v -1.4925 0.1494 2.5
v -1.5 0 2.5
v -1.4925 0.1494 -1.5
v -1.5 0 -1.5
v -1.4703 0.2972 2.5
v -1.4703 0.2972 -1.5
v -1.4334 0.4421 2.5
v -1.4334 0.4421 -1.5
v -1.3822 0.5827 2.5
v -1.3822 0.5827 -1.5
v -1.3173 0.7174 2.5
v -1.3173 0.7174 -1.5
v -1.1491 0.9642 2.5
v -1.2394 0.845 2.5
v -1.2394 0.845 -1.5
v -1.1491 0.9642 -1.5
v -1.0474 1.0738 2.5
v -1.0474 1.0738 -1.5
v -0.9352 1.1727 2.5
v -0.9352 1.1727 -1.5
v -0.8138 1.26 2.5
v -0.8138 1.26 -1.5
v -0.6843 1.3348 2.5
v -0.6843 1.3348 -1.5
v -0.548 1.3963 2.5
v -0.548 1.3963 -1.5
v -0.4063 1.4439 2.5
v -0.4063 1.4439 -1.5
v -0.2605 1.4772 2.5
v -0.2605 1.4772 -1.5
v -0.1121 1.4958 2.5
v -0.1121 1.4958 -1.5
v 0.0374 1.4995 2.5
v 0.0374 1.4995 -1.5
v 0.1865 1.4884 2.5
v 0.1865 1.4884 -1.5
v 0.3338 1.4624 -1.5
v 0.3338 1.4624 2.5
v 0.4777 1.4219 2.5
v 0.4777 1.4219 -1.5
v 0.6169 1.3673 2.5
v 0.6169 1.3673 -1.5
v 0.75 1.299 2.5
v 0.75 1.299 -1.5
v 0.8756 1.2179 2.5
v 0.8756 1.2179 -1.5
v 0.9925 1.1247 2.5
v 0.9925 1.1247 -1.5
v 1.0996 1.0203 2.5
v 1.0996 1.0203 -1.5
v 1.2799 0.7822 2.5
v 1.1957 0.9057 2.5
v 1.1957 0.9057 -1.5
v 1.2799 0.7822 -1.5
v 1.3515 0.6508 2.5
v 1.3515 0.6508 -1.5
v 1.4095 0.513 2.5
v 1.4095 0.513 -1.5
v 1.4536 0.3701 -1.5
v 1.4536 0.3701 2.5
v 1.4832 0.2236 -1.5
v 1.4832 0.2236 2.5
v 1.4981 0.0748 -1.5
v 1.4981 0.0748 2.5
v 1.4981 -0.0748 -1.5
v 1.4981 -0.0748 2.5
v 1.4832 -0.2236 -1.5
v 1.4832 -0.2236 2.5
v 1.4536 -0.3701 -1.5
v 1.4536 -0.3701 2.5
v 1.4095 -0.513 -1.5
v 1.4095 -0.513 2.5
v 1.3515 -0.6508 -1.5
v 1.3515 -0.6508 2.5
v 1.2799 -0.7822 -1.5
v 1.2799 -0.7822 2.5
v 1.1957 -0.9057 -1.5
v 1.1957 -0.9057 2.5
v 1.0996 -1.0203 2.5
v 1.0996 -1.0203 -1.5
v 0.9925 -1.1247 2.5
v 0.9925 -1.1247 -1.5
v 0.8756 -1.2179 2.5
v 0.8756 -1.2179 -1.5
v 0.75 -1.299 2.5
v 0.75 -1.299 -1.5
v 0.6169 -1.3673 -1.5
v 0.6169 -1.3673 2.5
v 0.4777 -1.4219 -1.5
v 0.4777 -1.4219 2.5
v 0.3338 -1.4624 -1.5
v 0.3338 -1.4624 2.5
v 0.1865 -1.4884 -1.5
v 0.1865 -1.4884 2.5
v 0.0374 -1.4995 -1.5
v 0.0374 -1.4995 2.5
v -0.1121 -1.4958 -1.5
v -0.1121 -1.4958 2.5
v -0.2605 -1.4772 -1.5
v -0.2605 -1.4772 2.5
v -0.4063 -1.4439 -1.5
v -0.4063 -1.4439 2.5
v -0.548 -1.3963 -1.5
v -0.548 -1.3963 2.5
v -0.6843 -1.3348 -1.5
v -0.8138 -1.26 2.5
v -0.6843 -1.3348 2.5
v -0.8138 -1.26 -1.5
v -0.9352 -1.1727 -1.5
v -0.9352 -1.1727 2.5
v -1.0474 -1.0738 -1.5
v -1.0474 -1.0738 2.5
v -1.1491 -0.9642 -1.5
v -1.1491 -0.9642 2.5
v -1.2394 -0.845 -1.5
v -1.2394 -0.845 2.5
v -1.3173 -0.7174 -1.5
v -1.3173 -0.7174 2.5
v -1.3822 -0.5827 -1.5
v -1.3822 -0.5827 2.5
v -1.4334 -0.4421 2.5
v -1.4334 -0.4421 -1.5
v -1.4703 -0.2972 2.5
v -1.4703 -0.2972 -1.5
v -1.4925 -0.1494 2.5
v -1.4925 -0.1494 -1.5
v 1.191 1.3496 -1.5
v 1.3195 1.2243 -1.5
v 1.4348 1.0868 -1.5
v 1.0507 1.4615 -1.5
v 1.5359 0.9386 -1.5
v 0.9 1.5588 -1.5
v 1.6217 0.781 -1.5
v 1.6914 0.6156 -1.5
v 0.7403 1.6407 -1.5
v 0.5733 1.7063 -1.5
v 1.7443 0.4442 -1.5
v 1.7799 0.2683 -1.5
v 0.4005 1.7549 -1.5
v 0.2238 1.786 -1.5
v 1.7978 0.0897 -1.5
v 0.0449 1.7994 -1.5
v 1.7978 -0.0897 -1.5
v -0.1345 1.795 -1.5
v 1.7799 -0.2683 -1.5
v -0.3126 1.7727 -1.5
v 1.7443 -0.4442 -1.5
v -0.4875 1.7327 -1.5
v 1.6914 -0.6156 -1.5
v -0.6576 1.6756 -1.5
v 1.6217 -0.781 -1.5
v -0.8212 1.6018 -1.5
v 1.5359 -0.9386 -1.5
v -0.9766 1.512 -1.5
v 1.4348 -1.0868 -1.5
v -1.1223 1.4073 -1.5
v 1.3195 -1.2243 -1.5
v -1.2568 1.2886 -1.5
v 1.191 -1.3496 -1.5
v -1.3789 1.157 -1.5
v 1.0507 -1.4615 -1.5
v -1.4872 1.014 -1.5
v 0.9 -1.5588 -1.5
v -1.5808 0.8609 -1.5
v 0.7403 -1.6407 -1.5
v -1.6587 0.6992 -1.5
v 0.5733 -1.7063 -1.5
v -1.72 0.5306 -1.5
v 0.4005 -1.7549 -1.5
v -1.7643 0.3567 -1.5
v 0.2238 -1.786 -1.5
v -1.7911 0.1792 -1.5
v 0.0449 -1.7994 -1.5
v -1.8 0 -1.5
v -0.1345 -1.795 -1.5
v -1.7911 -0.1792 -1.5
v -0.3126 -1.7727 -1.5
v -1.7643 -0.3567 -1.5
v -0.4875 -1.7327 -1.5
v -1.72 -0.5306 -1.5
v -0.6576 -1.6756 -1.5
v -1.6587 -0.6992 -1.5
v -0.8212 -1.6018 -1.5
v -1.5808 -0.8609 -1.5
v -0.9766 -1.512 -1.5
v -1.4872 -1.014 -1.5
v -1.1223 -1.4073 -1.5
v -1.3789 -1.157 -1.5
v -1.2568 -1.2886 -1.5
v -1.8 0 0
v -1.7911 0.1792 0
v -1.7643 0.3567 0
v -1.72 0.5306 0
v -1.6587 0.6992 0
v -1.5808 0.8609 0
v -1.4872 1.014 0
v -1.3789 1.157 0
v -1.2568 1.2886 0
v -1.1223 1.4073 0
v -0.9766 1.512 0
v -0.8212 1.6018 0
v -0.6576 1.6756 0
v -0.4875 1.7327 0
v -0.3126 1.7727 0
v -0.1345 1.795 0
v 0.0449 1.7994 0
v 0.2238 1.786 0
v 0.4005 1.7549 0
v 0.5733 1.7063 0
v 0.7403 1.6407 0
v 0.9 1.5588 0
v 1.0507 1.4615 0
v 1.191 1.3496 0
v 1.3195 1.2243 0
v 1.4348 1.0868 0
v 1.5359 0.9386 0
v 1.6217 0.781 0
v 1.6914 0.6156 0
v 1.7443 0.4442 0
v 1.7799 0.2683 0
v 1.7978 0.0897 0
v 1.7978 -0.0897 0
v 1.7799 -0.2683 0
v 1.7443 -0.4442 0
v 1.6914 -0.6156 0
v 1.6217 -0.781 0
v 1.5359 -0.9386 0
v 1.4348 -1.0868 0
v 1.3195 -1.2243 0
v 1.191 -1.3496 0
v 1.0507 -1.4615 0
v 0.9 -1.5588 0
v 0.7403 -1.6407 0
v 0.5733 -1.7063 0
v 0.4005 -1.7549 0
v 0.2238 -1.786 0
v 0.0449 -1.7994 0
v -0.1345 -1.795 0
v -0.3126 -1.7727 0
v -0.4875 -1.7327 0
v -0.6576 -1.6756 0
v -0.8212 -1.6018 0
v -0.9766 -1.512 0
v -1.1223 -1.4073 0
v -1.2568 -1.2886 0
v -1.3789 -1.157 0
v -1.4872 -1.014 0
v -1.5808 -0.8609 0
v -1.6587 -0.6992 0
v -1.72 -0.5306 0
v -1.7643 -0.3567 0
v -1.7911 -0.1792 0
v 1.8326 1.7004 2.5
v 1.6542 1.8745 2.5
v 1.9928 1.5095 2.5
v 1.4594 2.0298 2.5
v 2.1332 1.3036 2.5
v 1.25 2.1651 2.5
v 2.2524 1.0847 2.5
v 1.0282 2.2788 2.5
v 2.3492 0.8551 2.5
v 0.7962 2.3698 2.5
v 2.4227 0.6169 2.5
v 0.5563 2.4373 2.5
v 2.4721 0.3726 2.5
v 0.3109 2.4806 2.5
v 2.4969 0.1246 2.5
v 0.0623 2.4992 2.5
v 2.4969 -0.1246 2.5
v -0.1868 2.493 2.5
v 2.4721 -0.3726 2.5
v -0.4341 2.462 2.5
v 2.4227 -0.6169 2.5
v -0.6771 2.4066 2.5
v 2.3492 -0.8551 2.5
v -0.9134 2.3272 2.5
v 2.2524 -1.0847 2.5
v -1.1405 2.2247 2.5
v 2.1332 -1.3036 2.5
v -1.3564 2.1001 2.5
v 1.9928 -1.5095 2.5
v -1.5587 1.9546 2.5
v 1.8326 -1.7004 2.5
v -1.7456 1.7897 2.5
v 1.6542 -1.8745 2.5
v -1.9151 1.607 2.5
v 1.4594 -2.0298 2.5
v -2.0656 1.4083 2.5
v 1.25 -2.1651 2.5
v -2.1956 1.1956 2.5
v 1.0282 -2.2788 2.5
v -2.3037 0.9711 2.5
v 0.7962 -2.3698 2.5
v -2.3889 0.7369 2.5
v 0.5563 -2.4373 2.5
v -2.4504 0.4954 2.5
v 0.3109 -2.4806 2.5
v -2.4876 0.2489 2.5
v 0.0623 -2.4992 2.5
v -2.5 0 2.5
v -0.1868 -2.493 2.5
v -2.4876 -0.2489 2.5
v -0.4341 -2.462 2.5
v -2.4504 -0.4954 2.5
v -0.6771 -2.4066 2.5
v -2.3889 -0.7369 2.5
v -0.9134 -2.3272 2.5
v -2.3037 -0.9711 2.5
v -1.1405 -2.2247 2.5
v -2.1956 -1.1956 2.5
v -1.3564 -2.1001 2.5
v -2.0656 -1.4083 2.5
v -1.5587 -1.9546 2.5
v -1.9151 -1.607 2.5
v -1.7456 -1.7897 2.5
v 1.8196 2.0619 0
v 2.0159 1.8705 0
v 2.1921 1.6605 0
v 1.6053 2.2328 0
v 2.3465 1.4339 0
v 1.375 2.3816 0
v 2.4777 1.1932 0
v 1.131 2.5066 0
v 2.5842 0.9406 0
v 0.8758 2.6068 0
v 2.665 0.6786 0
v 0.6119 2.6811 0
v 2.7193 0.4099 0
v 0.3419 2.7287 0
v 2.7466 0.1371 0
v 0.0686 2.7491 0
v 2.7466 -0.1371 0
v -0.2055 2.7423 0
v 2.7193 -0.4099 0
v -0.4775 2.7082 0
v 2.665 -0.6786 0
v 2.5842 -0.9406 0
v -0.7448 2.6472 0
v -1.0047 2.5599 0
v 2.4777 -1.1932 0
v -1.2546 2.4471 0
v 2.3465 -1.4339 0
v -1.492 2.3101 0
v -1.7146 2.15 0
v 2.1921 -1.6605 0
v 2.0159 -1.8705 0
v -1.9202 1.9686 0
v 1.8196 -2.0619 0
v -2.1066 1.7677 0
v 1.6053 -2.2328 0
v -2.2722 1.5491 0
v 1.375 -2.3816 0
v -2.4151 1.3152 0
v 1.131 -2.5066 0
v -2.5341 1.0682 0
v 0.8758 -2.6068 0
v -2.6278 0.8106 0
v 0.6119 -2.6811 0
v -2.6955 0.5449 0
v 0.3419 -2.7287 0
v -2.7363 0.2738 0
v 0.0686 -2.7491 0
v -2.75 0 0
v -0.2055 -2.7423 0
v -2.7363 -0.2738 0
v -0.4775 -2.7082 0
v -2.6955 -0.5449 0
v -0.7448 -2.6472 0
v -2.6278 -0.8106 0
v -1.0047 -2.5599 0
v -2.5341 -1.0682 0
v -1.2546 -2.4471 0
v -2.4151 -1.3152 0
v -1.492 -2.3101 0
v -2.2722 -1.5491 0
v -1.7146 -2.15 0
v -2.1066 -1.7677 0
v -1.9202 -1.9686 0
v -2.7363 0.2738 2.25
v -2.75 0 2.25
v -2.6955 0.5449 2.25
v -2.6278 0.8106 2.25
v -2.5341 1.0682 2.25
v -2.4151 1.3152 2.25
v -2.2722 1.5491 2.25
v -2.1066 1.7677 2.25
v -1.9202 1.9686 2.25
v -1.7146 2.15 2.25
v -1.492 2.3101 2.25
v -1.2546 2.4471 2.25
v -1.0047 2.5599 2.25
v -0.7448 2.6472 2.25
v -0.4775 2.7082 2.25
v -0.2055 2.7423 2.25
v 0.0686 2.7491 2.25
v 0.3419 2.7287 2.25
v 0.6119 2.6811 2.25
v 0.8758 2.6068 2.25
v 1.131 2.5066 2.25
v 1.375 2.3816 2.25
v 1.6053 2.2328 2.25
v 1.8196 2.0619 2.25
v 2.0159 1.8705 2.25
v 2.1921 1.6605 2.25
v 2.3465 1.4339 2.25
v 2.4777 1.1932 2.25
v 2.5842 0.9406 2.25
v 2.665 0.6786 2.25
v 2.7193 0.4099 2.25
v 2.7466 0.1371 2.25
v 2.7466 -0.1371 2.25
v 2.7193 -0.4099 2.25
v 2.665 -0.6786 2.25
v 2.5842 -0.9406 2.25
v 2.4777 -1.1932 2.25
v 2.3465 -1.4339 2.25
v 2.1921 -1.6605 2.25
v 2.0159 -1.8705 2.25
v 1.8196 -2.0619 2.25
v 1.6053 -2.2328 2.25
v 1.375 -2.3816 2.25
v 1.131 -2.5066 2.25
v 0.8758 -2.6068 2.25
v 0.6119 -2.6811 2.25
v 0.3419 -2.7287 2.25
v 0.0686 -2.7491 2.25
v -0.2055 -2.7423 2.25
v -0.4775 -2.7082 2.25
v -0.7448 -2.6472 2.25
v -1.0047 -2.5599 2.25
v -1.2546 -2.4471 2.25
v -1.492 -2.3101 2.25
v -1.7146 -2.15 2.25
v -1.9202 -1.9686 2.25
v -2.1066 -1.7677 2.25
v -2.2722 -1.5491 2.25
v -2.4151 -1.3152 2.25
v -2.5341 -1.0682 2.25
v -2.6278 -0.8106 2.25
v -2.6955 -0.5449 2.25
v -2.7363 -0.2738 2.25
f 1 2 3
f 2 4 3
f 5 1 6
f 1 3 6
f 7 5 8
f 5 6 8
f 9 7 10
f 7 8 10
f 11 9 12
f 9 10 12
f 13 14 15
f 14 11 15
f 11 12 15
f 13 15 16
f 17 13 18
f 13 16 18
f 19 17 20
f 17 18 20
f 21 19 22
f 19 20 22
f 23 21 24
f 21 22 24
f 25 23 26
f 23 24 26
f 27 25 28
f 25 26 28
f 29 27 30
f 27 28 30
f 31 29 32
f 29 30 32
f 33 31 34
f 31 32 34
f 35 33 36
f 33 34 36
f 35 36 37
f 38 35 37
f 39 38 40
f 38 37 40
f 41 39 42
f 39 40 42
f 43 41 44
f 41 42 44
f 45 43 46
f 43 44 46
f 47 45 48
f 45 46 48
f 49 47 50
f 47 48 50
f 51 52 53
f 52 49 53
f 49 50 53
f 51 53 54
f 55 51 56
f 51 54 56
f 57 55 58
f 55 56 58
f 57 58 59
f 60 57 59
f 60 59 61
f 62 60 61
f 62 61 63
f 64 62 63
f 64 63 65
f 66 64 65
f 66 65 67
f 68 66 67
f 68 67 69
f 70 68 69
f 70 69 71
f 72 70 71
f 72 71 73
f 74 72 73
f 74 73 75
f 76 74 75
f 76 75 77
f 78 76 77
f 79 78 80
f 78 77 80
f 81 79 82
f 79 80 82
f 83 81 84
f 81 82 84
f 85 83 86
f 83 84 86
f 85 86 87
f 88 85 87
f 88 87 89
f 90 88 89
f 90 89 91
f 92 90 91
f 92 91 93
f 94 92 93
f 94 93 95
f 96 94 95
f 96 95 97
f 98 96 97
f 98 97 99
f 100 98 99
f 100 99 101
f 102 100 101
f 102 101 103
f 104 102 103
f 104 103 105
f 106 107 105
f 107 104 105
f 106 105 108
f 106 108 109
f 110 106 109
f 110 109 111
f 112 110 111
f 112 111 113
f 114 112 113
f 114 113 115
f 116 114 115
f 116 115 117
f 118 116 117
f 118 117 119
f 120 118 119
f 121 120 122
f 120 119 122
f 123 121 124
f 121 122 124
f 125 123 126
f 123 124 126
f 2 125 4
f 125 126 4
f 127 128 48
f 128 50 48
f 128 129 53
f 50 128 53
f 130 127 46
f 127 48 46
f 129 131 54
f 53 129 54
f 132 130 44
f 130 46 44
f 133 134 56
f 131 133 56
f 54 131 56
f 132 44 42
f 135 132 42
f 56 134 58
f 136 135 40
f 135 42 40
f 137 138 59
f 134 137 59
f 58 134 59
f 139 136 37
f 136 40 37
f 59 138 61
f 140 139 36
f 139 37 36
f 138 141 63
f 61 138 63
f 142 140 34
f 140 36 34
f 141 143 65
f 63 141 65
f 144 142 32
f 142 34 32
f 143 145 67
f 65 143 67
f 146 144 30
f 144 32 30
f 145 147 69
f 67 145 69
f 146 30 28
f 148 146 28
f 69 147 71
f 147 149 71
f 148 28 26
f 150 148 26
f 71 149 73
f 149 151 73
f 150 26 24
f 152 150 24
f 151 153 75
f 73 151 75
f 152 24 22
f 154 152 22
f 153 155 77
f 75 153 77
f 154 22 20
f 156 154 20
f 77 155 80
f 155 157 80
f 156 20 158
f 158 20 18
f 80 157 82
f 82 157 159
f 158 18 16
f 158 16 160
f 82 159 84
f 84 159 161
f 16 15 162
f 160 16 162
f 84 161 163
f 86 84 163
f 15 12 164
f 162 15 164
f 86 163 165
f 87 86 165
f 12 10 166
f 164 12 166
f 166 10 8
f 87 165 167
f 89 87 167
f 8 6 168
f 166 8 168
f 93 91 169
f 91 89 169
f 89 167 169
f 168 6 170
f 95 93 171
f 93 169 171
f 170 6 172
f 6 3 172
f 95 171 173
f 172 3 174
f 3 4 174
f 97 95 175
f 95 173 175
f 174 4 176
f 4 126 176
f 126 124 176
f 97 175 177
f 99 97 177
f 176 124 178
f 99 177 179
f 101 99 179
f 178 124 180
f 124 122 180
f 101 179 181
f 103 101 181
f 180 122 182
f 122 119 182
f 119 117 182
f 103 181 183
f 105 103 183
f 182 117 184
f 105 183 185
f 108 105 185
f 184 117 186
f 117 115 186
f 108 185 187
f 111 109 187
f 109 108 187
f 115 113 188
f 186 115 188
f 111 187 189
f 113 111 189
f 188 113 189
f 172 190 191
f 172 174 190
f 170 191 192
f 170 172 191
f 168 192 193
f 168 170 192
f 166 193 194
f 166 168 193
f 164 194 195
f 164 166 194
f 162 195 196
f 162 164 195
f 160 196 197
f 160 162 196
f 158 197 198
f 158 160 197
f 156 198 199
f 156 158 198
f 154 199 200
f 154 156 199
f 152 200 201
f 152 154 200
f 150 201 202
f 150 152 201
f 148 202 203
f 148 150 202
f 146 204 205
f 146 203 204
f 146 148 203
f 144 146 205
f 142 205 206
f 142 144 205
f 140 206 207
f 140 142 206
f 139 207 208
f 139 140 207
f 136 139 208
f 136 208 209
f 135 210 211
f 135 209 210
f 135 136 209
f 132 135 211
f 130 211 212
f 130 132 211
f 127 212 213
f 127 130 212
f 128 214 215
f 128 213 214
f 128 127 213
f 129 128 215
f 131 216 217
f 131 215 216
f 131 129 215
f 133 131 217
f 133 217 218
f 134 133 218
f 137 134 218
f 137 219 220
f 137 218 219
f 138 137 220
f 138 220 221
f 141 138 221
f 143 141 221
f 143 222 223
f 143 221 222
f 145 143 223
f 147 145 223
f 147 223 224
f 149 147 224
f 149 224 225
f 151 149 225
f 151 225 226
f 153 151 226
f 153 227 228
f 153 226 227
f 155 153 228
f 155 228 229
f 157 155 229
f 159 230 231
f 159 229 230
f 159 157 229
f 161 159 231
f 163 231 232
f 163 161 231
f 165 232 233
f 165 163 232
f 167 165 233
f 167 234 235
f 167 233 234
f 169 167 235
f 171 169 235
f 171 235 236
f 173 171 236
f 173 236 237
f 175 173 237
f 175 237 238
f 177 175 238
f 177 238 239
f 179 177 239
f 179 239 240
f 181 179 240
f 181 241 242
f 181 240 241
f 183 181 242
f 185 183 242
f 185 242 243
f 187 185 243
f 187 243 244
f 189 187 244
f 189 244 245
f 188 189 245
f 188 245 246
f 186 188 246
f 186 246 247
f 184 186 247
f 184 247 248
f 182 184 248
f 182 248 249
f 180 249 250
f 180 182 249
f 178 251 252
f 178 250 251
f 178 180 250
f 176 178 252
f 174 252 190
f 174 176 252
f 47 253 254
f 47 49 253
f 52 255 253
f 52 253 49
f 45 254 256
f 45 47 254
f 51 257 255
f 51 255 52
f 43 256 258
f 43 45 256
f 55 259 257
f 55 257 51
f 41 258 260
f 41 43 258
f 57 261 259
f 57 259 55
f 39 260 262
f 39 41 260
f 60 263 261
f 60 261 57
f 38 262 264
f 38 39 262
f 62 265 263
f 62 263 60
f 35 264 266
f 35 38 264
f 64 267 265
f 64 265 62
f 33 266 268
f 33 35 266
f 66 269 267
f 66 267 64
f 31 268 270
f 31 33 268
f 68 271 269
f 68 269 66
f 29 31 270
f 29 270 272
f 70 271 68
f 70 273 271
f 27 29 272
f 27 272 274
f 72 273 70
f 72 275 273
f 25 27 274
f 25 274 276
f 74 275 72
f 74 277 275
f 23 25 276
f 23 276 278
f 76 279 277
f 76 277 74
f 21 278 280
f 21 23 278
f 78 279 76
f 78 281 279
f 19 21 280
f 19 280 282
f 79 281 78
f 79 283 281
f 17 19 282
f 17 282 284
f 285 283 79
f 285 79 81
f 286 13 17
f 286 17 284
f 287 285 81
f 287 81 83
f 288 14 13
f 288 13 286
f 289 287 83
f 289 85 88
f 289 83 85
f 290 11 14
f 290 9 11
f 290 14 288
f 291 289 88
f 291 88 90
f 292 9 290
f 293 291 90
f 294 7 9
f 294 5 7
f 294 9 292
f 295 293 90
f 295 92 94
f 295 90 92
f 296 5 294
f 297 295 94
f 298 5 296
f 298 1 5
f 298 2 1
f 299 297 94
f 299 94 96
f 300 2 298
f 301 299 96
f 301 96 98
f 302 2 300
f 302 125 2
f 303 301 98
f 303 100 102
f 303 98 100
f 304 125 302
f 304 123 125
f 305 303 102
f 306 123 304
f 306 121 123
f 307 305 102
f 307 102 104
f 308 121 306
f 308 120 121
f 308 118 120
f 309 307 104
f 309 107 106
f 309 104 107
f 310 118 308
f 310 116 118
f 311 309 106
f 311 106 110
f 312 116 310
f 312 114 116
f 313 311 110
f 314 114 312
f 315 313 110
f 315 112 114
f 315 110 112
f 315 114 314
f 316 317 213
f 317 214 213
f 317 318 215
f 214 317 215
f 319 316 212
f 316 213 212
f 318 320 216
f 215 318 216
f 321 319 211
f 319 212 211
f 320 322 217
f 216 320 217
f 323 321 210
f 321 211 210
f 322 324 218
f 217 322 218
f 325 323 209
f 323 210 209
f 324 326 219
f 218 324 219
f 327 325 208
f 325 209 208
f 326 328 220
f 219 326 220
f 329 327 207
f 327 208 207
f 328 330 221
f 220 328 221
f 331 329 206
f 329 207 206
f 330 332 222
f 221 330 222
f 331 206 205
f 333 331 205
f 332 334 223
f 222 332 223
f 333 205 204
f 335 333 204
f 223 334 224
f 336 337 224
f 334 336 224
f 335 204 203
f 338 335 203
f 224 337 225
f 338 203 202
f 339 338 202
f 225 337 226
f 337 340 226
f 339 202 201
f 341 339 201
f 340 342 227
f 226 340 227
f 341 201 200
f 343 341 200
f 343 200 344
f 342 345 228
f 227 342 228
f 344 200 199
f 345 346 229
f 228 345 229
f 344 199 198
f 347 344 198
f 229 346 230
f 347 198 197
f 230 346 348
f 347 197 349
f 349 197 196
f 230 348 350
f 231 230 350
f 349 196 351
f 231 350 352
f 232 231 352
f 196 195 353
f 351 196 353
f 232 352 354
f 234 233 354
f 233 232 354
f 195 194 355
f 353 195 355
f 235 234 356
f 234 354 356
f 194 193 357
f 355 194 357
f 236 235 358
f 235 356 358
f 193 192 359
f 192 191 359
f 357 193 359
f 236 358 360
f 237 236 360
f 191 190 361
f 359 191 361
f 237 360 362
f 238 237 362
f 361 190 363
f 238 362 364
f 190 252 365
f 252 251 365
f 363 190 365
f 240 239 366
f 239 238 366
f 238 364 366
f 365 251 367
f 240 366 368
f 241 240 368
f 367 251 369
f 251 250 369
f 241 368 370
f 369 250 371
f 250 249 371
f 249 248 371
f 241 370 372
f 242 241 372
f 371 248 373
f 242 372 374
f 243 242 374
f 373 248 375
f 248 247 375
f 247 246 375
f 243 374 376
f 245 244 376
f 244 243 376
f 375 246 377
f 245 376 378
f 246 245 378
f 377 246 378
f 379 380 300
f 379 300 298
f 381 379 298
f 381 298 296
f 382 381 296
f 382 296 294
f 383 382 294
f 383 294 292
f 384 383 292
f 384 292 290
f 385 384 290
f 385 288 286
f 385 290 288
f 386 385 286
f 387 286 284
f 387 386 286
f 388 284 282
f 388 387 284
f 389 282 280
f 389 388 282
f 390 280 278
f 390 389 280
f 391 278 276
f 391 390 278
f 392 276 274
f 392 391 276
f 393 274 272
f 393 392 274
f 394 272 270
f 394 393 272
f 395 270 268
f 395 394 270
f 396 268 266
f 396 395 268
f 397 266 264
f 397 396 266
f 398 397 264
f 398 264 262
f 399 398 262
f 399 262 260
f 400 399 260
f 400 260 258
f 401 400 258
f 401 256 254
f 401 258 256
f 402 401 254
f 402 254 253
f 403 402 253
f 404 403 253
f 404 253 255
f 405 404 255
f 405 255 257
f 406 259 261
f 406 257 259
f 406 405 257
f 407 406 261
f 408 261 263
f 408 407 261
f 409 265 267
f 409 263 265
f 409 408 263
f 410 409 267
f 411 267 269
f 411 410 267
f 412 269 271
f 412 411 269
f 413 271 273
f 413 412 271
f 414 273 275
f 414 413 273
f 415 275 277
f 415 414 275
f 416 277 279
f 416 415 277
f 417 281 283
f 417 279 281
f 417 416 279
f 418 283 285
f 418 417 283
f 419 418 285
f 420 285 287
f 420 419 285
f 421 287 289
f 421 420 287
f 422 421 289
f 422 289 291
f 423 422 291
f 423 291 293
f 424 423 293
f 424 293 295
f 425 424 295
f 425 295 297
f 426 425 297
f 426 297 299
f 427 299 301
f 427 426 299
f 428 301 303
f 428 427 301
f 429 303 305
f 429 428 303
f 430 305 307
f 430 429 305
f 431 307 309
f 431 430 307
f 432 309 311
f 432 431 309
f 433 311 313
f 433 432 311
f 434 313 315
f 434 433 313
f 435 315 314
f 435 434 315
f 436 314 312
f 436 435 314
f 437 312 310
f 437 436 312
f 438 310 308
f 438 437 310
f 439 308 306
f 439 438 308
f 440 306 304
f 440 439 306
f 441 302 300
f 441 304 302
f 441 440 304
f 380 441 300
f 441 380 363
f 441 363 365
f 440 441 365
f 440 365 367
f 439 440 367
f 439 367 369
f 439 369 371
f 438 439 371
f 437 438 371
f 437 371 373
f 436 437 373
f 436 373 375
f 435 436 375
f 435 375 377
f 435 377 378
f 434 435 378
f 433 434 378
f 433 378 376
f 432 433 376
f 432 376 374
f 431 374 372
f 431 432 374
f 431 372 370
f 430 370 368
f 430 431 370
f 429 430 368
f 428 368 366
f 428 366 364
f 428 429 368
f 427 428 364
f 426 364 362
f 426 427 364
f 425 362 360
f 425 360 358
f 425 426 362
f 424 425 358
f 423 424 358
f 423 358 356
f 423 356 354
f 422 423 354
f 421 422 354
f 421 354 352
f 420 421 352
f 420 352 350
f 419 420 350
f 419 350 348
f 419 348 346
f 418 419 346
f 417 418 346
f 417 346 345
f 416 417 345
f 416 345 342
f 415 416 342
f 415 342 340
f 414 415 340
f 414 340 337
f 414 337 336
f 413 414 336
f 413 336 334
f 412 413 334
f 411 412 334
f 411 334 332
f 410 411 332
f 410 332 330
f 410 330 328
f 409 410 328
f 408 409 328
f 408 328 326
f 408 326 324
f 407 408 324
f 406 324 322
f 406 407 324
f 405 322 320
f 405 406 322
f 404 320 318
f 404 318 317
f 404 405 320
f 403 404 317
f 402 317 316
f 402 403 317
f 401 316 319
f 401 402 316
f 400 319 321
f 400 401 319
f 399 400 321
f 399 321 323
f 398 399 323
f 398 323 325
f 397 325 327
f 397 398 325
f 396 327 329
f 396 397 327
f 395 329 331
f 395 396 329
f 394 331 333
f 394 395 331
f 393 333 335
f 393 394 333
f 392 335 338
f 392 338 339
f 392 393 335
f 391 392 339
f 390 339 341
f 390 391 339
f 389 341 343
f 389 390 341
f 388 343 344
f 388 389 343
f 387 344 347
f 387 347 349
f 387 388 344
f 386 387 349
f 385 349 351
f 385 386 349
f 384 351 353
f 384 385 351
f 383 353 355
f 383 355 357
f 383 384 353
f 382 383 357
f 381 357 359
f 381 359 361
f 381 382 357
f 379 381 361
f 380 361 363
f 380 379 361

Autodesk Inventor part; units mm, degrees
ref_plane "YZ Plane" through (0, 0, 0) normal (1, 0, 0) x (0, 1, 0)
ref_plane "XZ Plane" through (0, 0, 0) normal (0, 1, 0) x (-1, 0, 0)
ref_plane "XY Plane" through (0, 0, 0) normal (0, 0, 1) x (1, 0, 0)
sketch "Эскиз1" plane through (0, 0, 0) normal (0, 1, 0) x (-1, 0, 0)
  line L0 (0, 0) -> (2.75, 0)
  line L1 (2.75, 0) -> (2.75, 2.5)
  line L2 (2.75, 2.5) -> (-2.75, 2.5)
  line L3 (-2.75, 2.5) -> (-2.75, 0)
  line L4 (-2.75, 0) -> (2.75, 0)
  line L5 (0, 0) -> (1.8, 0)
  line L6 (1.8, 0) -> (1.8, -1.5)
  line L7 (1.8, -1.5) -> (-1.8, -1.5)
  line L8 (-1.8, -1.5) -> (-1.8, 0)
  line L9 (0, 2.5) -> (1.5, 2.5)
  line L10 (1.5, 2.5) -> (1.5, -1.5)
  line L11 (0, -1.5) -> (0, 2.5)
  dimension "d0" = 2.75
  dimension "d1" = 2.5
  dimension "d2" = 5.5
  dimension "d3" = 1.8
  dimension "d4" = 1.5
  dimension "d5" = 3.6
  dimension "d6" = 1.5
revolve "Вращение1" add sketch "Эскиз1" angle 360 about axis through (0, 0, -1.5) along (0, 0, 1) contours L0 L10 L2 L1 | L6 L7 L10 L0
thread "Резьба1" size "M3x0.5" class "6H" standard "ANSI Metric M Profile" full length
chamfer "Фаска1" distance 0.25 angle 45 1 edges at (2.75, 0, 2.5)
properties part number "soldered nut"
